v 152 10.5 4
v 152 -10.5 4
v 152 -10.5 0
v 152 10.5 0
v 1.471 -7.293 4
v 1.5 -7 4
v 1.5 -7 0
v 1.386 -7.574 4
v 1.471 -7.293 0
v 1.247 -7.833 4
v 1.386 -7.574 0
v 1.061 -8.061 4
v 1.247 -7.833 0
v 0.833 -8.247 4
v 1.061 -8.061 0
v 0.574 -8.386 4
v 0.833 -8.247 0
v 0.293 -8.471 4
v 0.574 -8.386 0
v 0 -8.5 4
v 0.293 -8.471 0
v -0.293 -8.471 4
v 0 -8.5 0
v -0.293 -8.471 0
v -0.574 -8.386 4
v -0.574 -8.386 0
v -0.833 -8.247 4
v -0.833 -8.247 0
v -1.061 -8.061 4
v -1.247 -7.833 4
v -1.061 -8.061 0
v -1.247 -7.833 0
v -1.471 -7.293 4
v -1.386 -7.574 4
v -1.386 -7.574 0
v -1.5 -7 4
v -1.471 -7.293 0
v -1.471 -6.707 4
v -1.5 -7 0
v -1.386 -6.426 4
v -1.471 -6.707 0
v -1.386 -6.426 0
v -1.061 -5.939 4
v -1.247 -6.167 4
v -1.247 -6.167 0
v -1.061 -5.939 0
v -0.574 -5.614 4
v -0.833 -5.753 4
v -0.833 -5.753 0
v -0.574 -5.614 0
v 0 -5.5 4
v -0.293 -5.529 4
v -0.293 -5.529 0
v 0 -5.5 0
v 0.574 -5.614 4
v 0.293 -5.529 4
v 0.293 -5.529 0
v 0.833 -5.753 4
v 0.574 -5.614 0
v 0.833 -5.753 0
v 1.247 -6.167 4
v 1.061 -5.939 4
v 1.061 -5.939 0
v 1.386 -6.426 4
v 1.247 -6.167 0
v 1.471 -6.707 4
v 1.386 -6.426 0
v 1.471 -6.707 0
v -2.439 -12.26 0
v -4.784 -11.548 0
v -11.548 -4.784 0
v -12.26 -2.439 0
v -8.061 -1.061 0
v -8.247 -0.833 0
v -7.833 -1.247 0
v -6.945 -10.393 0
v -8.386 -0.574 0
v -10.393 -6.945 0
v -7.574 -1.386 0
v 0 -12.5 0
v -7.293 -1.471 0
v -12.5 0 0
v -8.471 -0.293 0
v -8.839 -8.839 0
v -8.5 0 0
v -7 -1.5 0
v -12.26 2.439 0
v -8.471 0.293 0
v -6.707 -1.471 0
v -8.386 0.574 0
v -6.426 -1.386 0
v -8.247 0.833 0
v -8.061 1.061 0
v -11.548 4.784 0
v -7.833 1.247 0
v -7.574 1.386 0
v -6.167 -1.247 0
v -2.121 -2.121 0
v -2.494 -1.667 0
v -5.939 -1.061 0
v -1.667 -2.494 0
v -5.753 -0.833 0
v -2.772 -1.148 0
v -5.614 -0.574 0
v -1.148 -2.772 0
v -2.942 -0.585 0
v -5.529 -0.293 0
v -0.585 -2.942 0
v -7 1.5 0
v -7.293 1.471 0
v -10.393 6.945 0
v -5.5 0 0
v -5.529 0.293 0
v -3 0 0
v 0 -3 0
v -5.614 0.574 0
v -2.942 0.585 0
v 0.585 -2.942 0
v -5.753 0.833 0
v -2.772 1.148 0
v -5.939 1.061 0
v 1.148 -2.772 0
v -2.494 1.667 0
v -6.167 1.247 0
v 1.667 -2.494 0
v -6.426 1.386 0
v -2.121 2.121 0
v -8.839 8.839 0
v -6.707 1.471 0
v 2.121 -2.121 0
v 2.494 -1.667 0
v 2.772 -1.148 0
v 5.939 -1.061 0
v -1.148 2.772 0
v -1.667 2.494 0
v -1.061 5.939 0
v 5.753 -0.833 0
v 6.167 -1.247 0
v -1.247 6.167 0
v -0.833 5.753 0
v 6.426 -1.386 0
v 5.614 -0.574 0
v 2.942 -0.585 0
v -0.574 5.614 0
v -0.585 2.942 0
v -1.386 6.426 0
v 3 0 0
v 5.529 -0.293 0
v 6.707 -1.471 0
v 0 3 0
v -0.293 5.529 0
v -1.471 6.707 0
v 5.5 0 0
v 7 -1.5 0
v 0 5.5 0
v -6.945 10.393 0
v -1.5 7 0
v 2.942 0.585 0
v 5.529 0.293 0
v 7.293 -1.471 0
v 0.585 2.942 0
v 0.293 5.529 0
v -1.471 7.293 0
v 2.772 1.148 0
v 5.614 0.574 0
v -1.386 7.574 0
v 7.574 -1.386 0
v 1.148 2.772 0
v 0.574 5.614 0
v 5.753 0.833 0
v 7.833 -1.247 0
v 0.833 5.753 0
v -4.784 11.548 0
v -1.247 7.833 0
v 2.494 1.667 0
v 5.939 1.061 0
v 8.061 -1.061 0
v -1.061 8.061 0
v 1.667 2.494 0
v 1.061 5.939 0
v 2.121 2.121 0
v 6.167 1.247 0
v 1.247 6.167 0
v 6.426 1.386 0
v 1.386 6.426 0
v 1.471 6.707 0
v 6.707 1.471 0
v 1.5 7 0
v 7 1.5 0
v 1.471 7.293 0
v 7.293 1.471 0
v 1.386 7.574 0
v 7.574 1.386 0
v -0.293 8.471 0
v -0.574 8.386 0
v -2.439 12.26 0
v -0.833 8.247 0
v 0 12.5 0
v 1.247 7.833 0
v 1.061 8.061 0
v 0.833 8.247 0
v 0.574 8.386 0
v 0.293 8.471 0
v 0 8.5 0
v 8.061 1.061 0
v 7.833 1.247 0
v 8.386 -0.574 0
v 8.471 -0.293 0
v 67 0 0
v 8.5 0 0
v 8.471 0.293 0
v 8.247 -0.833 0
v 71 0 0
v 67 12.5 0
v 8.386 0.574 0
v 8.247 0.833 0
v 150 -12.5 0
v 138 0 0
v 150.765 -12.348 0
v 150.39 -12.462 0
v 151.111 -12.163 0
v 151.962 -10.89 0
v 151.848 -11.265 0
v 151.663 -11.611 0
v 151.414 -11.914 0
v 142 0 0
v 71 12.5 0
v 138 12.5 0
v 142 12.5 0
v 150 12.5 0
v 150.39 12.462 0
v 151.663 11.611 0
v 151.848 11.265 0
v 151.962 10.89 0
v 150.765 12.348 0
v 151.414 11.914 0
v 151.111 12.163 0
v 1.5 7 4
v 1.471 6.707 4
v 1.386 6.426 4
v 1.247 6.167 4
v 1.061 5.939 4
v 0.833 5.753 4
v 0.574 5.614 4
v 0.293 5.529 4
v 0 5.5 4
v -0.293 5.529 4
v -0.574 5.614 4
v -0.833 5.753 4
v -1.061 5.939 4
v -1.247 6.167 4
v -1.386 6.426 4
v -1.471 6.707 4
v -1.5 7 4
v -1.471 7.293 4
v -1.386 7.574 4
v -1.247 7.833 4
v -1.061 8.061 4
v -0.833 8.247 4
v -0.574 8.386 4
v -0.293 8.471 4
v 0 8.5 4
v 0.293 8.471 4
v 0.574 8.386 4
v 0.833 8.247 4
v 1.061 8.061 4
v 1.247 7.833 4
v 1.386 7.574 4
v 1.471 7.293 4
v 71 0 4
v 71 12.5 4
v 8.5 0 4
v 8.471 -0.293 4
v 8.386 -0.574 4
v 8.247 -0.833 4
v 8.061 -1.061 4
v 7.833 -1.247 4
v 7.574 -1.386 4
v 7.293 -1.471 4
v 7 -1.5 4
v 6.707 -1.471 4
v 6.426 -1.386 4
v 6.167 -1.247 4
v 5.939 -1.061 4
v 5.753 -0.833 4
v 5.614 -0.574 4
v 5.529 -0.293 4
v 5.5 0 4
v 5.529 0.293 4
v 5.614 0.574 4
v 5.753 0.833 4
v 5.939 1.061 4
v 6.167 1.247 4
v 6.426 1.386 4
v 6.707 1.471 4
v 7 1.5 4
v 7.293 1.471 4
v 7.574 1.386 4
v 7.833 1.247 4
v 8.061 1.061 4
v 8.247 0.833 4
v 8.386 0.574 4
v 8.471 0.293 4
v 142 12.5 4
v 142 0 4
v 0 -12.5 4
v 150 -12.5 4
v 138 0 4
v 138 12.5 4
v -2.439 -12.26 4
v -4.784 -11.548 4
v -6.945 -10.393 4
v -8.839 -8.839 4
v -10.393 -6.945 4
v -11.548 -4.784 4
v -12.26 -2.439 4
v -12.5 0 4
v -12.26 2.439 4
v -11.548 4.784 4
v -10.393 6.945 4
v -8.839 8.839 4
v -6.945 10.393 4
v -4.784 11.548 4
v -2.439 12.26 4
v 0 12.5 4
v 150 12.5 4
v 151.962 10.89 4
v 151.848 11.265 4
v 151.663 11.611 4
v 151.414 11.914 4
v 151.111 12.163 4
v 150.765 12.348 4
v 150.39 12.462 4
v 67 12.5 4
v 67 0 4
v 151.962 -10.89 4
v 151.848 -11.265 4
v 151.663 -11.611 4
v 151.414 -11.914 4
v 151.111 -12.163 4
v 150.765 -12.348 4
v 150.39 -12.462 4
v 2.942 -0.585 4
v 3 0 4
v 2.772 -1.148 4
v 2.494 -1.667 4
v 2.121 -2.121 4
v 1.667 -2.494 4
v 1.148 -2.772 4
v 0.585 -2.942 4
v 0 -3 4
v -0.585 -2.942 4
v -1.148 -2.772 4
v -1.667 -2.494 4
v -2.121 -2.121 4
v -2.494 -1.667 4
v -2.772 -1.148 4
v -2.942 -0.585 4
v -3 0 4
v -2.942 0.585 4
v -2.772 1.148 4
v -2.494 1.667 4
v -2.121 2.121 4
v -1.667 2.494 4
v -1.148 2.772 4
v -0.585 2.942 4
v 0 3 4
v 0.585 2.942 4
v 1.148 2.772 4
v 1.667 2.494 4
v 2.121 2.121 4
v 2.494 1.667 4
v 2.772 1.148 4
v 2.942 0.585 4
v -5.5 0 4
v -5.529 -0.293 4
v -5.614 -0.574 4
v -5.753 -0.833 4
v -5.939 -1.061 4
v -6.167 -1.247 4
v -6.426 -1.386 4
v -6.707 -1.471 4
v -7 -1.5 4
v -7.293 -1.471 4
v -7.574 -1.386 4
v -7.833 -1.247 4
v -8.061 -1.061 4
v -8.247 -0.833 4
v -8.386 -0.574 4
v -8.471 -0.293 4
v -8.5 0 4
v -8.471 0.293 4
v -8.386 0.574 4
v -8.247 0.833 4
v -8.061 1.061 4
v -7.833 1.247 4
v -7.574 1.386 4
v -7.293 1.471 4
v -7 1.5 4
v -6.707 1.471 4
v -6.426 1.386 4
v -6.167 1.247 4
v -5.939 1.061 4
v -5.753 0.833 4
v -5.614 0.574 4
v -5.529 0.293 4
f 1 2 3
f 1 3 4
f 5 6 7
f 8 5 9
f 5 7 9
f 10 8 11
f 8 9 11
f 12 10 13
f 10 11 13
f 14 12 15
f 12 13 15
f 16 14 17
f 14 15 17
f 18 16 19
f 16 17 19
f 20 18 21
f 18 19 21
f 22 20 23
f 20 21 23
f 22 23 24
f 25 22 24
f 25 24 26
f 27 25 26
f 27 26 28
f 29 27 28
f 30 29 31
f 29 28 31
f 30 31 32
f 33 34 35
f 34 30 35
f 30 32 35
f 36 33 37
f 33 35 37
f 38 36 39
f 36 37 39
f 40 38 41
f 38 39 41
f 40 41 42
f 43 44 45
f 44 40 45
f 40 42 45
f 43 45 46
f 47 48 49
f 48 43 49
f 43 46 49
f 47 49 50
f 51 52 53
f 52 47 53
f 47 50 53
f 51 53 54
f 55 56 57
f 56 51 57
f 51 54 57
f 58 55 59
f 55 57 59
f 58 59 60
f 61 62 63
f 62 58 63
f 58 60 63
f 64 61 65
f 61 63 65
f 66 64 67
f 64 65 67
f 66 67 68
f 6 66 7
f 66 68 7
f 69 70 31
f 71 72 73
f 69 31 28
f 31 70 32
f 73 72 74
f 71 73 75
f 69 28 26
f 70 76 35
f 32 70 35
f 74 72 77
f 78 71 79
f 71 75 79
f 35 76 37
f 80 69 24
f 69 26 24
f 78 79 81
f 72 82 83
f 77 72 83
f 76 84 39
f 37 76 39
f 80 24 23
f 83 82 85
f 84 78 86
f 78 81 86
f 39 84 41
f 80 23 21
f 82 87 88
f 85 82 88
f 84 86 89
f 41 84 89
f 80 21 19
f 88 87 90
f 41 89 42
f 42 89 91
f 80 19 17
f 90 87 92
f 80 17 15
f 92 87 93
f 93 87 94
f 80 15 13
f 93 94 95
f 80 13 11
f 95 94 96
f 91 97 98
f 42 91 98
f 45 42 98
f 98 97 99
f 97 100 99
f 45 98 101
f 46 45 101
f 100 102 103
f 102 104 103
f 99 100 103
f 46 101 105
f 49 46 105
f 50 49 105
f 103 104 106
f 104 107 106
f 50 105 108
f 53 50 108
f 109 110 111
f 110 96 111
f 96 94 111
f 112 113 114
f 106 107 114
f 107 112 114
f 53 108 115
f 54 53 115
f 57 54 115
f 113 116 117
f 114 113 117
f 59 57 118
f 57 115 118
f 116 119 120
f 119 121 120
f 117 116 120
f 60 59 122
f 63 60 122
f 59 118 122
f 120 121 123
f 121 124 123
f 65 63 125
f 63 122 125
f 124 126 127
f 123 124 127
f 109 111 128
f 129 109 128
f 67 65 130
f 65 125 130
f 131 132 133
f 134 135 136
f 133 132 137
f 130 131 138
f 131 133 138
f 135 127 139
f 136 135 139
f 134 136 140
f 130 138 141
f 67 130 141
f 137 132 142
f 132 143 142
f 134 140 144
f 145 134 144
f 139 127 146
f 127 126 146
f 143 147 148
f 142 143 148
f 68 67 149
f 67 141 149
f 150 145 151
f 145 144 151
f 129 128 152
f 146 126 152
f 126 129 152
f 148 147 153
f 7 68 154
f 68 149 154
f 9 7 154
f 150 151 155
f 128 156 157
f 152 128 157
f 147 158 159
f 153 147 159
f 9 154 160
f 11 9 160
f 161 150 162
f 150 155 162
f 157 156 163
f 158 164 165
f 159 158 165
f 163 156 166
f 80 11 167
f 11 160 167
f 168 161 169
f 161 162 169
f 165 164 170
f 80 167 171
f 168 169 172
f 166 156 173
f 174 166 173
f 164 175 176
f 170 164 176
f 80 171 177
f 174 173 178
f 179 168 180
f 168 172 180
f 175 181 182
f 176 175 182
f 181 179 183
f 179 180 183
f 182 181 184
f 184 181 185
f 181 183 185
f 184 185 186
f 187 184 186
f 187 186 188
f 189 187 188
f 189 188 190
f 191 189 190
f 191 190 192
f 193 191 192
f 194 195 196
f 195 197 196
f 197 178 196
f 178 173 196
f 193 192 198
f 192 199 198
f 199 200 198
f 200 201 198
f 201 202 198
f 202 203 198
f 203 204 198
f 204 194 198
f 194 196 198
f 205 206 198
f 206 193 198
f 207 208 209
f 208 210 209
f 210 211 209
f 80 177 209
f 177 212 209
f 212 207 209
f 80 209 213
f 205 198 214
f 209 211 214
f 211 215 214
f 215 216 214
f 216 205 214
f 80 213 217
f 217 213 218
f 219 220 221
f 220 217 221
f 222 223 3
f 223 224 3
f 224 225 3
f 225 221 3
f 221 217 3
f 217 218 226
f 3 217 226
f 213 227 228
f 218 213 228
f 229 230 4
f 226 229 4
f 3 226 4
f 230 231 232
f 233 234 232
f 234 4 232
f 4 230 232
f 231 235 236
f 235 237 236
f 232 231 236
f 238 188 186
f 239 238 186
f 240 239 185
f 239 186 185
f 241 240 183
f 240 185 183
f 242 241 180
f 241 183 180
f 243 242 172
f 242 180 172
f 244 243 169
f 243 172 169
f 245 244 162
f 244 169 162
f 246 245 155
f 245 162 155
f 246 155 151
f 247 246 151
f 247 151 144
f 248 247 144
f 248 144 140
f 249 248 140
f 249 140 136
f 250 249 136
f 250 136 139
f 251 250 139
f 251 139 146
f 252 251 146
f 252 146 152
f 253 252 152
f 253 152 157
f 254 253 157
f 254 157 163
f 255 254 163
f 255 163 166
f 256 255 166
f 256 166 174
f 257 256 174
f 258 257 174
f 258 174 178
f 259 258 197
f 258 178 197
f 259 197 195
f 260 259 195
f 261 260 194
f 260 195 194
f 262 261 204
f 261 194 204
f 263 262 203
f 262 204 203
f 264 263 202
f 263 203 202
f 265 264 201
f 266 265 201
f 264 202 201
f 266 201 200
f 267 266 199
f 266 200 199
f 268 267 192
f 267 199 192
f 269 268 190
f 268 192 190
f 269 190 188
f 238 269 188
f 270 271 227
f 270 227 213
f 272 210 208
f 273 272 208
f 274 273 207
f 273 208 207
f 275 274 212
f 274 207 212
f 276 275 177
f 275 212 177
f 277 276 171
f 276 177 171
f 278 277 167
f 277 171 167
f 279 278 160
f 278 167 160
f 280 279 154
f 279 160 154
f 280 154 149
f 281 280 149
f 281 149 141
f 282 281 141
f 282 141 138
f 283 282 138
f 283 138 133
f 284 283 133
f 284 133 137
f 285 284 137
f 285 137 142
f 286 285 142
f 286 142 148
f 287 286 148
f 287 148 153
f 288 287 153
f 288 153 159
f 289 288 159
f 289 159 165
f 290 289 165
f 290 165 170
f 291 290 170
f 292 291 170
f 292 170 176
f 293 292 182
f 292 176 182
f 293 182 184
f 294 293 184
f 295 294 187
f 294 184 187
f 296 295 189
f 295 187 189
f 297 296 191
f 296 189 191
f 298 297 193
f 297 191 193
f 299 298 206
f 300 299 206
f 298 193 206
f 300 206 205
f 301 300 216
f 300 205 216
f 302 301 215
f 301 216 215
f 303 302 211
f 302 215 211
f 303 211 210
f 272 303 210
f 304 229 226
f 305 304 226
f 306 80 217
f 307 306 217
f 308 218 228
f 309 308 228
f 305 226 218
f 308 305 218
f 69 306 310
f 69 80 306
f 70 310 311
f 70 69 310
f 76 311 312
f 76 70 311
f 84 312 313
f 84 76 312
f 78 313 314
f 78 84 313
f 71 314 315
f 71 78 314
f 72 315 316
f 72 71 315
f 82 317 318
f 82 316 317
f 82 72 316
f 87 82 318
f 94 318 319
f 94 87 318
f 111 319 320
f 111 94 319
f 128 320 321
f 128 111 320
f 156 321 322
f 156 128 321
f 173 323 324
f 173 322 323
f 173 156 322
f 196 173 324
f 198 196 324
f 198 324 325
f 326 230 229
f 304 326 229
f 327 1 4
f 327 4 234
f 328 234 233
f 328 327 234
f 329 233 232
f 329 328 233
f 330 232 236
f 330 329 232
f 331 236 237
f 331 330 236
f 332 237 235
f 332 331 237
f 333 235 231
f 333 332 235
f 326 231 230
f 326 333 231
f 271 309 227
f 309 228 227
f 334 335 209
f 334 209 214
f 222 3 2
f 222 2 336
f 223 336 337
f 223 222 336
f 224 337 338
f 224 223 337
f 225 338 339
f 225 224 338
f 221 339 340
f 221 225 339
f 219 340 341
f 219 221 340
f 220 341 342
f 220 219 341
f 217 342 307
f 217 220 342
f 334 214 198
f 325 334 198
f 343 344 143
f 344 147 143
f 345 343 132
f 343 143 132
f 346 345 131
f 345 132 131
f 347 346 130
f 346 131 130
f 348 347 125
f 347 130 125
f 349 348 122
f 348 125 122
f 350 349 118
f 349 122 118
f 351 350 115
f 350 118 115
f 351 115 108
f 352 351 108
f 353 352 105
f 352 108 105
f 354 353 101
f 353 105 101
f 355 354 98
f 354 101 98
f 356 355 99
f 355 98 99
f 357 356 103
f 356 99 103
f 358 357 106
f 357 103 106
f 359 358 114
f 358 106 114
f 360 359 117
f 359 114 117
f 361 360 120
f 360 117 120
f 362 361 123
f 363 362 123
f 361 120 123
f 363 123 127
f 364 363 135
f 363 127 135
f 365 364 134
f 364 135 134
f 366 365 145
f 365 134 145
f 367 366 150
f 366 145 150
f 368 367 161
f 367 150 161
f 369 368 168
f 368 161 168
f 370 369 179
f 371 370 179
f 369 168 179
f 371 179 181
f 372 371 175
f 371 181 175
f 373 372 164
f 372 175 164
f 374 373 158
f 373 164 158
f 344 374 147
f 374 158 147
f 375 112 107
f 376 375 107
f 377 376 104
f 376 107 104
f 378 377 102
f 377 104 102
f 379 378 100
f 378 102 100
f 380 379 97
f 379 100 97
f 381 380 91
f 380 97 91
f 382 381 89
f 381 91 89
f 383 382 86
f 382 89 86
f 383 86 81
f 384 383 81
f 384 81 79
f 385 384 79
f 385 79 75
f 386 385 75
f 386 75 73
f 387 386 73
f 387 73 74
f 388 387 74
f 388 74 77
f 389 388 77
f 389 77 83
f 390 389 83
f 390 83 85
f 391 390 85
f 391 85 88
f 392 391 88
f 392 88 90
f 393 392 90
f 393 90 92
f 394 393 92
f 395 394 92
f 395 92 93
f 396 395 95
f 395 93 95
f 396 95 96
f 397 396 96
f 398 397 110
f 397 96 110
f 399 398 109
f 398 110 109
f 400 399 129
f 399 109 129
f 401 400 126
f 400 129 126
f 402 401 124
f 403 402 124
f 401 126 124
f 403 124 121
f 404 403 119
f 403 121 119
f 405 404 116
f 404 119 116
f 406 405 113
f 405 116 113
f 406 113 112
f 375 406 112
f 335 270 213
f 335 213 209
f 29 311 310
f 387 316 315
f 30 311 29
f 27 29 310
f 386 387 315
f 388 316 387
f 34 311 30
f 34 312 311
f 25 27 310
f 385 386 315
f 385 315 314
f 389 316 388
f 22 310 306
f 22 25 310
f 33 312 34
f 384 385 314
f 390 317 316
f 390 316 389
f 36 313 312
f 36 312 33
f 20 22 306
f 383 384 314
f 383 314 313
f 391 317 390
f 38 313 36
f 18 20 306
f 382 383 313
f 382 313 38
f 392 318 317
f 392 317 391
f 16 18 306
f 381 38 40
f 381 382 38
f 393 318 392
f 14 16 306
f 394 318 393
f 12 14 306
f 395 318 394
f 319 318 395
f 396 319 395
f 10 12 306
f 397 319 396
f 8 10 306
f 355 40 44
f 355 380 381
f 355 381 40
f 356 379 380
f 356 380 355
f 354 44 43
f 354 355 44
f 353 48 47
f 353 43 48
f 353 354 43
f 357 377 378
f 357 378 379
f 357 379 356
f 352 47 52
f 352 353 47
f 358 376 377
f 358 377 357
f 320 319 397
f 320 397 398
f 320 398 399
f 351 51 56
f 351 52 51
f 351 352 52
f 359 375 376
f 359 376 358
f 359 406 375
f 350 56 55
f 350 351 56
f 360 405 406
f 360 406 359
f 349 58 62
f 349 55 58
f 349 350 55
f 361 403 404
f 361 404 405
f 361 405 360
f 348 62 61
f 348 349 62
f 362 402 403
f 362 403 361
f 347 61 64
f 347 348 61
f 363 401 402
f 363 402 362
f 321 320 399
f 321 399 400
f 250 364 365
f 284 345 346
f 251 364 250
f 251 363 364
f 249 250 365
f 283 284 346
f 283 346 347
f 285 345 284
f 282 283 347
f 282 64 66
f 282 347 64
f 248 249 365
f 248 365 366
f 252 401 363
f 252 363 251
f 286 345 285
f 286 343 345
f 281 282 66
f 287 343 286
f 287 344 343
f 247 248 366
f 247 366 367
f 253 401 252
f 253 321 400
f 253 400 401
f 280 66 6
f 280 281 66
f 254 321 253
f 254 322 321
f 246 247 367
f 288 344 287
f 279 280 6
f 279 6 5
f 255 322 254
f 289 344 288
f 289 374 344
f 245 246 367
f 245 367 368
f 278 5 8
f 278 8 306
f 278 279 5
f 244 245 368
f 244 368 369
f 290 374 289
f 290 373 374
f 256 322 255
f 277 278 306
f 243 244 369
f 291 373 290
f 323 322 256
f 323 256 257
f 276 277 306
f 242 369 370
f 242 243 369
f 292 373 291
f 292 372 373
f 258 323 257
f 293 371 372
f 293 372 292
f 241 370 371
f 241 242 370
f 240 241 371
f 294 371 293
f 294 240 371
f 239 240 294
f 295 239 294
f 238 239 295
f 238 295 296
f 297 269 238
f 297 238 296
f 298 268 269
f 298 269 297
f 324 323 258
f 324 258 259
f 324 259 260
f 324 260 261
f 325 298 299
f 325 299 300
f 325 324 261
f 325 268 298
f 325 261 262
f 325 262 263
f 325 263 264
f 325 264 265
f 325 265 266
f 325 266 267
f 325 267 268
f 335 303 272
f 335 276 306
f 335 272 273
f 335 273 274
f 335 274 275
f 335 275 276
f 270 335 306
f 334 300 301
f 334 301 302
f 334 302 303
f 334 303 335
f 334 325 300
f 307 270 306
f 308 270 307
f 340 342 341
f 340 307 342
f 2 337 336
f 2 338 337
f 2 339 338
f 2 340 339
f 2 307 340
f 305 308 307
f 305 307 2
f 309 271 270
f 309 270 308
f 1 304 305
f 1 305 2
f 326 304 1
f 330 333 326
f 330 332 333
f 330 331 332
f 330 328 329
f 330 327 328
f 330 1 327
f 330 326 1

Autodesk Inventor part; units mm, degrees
ref_plane "YZ Plane" through (0, 0, 0) normal (1, 0, 0) x (0, 1, 0)
ref_plane "XZ Plane" through (0, 0, 0) normal (0, 1, 0) x (-1, 0, 0)
ref_plane "XY Plane" through (0, 0, 0) normal (0, 0, 1) x (1, 0, 0)
sketch "Эскиз1" plane through (0, 0, 0) normal (0, 0, 1) x (1, 0, 0)
  circle A0 centre (0, 0) radius 12.5
  line L0 (0, -12.5) -> (280, -12.5)
  line L1 (280, -12.5) -> (280, 12.5)
  line L2 (280, 12.5) -> (0, 12.5)
  line L3 (0, 12.5) -> (0, -12.5)
  circle A1 centre (280, 0) radius 12.5
  circle A2 centre (0, 0) radius 7
  circle A3 centre (280, 0) radius 7
  circle A4 centre (0, 7) radius 1.5
  circle A5 centre (7, 0) radius 1.5
  circle A6 centre (0, -7) radius 1.5
  circle A7 centre (-7, 0) radius 1.5
  circle A8 centre (0, 0) radius 3
  circle A9 centre (280, 0) radius 3
  circle A10 centre (287, 0) radius 1.5
  circle A11 centre (280, 7) radius 1.5
  circle A12 centre (280, -7) radius 1.5
  circle A13 centre (273, 0) radius 1.5
  line L4 (138, 12.5) -> (142, 12.5)
  line L5 (142, 12.5) -> (142, 0)
  line L6 (142, 0) -> (138, 0)
  line L7 (138, 0) -> (138, 12.5)
  point P0 (280, -12.5)
  point P1 (140, 12.5)
  point P2 (140, 12.5)
  point P3 (142, 12.5)
  dimension "d0" = 25
  dimension "d2" = 14
  dimension "d3" = 14
  dimension "d4" = 3
  dimension "d5" = 3
  dimension "d6" = 3
  dimension "d7" = 3
  dimension "d8" = 6
  dimension "d9" = 6
  dimension "d10" = 3
  dimension "d11" = 3
  dimension "d12" = 3
  dimension "d13" = 3
  dimension "d16" = 0
  dimension "d17" = 4
  dimension "d27" = 280
extrude "Выдавливание1" add sketch "Эскиз1" along normal blind 4 contours A0 L3 A6 A2 A5 A4 | A0 L2 L7 L6 L5 A1 L0 | L3 A4 A2 A7 A6 A0 | A1 L1 A11 A3 A13 A12 | L1 A12 A3 A10 A11 A1 | A4 L3 A8 A6 A2 A7 | A4 A2 A5 A6 L3 A8 | A3 A13 A11 L1 A9 A12 | L1 A9 A11 A3 A10 A12
sketch "Эскиз2" plane through (0, 0, 4) normal (0, 0, 1) x (1, 0, 0)
  line L0 (152, 23.4347) -> (358.3941, 23.4347)
  line L1 (358.3941, 23.4347) -> (358.3941, -33.9487)
  line L2 (358.3941, -33.9487) -> (152, -33.9487)
  line L3 (152, -33.9487) -> (152, 23.4347)
  line L4 (142, 12.5) -> (142, 0) projected
  point P0 (0, 0)
  dimension "d18" = 10
extrude "Выдавливание2" cut sketch "Эскиз2" against normal blind 10
fillet "Сопряжение1" radius 2 2 edges at (152, 12.5, 2) (152, -12.5, 2)
sketch "Эскиз3" plane through (0, 0, 4) normal (0, 0, 1) x (1, 0, 0)
  line L0 (138, 12.5) -> (0, 12.5) projected
  line L1 (67, 12.5) -> (71, 12.5)
  line L2 (71, 12.5) -> (71, 0)
  line L3 (71, 0) -> (67, 0)
  line L4 (67, 0) -> (67, 12.5)
  line L5 (142, 0) -> (138, 0) projected
  point P0 (0, 0)
  point P1 (69, 12.5)
  point P2 (69, 12.5)
  point P3 (71, 12.5)
  point P4 (140, 0)
  dimension "d22" = 0
  dimension "d23" = 4
extrude "Выдавливание3" cut sketch "Эскиз3" against normal blind 10
properties material "Дерево (вишня)"
